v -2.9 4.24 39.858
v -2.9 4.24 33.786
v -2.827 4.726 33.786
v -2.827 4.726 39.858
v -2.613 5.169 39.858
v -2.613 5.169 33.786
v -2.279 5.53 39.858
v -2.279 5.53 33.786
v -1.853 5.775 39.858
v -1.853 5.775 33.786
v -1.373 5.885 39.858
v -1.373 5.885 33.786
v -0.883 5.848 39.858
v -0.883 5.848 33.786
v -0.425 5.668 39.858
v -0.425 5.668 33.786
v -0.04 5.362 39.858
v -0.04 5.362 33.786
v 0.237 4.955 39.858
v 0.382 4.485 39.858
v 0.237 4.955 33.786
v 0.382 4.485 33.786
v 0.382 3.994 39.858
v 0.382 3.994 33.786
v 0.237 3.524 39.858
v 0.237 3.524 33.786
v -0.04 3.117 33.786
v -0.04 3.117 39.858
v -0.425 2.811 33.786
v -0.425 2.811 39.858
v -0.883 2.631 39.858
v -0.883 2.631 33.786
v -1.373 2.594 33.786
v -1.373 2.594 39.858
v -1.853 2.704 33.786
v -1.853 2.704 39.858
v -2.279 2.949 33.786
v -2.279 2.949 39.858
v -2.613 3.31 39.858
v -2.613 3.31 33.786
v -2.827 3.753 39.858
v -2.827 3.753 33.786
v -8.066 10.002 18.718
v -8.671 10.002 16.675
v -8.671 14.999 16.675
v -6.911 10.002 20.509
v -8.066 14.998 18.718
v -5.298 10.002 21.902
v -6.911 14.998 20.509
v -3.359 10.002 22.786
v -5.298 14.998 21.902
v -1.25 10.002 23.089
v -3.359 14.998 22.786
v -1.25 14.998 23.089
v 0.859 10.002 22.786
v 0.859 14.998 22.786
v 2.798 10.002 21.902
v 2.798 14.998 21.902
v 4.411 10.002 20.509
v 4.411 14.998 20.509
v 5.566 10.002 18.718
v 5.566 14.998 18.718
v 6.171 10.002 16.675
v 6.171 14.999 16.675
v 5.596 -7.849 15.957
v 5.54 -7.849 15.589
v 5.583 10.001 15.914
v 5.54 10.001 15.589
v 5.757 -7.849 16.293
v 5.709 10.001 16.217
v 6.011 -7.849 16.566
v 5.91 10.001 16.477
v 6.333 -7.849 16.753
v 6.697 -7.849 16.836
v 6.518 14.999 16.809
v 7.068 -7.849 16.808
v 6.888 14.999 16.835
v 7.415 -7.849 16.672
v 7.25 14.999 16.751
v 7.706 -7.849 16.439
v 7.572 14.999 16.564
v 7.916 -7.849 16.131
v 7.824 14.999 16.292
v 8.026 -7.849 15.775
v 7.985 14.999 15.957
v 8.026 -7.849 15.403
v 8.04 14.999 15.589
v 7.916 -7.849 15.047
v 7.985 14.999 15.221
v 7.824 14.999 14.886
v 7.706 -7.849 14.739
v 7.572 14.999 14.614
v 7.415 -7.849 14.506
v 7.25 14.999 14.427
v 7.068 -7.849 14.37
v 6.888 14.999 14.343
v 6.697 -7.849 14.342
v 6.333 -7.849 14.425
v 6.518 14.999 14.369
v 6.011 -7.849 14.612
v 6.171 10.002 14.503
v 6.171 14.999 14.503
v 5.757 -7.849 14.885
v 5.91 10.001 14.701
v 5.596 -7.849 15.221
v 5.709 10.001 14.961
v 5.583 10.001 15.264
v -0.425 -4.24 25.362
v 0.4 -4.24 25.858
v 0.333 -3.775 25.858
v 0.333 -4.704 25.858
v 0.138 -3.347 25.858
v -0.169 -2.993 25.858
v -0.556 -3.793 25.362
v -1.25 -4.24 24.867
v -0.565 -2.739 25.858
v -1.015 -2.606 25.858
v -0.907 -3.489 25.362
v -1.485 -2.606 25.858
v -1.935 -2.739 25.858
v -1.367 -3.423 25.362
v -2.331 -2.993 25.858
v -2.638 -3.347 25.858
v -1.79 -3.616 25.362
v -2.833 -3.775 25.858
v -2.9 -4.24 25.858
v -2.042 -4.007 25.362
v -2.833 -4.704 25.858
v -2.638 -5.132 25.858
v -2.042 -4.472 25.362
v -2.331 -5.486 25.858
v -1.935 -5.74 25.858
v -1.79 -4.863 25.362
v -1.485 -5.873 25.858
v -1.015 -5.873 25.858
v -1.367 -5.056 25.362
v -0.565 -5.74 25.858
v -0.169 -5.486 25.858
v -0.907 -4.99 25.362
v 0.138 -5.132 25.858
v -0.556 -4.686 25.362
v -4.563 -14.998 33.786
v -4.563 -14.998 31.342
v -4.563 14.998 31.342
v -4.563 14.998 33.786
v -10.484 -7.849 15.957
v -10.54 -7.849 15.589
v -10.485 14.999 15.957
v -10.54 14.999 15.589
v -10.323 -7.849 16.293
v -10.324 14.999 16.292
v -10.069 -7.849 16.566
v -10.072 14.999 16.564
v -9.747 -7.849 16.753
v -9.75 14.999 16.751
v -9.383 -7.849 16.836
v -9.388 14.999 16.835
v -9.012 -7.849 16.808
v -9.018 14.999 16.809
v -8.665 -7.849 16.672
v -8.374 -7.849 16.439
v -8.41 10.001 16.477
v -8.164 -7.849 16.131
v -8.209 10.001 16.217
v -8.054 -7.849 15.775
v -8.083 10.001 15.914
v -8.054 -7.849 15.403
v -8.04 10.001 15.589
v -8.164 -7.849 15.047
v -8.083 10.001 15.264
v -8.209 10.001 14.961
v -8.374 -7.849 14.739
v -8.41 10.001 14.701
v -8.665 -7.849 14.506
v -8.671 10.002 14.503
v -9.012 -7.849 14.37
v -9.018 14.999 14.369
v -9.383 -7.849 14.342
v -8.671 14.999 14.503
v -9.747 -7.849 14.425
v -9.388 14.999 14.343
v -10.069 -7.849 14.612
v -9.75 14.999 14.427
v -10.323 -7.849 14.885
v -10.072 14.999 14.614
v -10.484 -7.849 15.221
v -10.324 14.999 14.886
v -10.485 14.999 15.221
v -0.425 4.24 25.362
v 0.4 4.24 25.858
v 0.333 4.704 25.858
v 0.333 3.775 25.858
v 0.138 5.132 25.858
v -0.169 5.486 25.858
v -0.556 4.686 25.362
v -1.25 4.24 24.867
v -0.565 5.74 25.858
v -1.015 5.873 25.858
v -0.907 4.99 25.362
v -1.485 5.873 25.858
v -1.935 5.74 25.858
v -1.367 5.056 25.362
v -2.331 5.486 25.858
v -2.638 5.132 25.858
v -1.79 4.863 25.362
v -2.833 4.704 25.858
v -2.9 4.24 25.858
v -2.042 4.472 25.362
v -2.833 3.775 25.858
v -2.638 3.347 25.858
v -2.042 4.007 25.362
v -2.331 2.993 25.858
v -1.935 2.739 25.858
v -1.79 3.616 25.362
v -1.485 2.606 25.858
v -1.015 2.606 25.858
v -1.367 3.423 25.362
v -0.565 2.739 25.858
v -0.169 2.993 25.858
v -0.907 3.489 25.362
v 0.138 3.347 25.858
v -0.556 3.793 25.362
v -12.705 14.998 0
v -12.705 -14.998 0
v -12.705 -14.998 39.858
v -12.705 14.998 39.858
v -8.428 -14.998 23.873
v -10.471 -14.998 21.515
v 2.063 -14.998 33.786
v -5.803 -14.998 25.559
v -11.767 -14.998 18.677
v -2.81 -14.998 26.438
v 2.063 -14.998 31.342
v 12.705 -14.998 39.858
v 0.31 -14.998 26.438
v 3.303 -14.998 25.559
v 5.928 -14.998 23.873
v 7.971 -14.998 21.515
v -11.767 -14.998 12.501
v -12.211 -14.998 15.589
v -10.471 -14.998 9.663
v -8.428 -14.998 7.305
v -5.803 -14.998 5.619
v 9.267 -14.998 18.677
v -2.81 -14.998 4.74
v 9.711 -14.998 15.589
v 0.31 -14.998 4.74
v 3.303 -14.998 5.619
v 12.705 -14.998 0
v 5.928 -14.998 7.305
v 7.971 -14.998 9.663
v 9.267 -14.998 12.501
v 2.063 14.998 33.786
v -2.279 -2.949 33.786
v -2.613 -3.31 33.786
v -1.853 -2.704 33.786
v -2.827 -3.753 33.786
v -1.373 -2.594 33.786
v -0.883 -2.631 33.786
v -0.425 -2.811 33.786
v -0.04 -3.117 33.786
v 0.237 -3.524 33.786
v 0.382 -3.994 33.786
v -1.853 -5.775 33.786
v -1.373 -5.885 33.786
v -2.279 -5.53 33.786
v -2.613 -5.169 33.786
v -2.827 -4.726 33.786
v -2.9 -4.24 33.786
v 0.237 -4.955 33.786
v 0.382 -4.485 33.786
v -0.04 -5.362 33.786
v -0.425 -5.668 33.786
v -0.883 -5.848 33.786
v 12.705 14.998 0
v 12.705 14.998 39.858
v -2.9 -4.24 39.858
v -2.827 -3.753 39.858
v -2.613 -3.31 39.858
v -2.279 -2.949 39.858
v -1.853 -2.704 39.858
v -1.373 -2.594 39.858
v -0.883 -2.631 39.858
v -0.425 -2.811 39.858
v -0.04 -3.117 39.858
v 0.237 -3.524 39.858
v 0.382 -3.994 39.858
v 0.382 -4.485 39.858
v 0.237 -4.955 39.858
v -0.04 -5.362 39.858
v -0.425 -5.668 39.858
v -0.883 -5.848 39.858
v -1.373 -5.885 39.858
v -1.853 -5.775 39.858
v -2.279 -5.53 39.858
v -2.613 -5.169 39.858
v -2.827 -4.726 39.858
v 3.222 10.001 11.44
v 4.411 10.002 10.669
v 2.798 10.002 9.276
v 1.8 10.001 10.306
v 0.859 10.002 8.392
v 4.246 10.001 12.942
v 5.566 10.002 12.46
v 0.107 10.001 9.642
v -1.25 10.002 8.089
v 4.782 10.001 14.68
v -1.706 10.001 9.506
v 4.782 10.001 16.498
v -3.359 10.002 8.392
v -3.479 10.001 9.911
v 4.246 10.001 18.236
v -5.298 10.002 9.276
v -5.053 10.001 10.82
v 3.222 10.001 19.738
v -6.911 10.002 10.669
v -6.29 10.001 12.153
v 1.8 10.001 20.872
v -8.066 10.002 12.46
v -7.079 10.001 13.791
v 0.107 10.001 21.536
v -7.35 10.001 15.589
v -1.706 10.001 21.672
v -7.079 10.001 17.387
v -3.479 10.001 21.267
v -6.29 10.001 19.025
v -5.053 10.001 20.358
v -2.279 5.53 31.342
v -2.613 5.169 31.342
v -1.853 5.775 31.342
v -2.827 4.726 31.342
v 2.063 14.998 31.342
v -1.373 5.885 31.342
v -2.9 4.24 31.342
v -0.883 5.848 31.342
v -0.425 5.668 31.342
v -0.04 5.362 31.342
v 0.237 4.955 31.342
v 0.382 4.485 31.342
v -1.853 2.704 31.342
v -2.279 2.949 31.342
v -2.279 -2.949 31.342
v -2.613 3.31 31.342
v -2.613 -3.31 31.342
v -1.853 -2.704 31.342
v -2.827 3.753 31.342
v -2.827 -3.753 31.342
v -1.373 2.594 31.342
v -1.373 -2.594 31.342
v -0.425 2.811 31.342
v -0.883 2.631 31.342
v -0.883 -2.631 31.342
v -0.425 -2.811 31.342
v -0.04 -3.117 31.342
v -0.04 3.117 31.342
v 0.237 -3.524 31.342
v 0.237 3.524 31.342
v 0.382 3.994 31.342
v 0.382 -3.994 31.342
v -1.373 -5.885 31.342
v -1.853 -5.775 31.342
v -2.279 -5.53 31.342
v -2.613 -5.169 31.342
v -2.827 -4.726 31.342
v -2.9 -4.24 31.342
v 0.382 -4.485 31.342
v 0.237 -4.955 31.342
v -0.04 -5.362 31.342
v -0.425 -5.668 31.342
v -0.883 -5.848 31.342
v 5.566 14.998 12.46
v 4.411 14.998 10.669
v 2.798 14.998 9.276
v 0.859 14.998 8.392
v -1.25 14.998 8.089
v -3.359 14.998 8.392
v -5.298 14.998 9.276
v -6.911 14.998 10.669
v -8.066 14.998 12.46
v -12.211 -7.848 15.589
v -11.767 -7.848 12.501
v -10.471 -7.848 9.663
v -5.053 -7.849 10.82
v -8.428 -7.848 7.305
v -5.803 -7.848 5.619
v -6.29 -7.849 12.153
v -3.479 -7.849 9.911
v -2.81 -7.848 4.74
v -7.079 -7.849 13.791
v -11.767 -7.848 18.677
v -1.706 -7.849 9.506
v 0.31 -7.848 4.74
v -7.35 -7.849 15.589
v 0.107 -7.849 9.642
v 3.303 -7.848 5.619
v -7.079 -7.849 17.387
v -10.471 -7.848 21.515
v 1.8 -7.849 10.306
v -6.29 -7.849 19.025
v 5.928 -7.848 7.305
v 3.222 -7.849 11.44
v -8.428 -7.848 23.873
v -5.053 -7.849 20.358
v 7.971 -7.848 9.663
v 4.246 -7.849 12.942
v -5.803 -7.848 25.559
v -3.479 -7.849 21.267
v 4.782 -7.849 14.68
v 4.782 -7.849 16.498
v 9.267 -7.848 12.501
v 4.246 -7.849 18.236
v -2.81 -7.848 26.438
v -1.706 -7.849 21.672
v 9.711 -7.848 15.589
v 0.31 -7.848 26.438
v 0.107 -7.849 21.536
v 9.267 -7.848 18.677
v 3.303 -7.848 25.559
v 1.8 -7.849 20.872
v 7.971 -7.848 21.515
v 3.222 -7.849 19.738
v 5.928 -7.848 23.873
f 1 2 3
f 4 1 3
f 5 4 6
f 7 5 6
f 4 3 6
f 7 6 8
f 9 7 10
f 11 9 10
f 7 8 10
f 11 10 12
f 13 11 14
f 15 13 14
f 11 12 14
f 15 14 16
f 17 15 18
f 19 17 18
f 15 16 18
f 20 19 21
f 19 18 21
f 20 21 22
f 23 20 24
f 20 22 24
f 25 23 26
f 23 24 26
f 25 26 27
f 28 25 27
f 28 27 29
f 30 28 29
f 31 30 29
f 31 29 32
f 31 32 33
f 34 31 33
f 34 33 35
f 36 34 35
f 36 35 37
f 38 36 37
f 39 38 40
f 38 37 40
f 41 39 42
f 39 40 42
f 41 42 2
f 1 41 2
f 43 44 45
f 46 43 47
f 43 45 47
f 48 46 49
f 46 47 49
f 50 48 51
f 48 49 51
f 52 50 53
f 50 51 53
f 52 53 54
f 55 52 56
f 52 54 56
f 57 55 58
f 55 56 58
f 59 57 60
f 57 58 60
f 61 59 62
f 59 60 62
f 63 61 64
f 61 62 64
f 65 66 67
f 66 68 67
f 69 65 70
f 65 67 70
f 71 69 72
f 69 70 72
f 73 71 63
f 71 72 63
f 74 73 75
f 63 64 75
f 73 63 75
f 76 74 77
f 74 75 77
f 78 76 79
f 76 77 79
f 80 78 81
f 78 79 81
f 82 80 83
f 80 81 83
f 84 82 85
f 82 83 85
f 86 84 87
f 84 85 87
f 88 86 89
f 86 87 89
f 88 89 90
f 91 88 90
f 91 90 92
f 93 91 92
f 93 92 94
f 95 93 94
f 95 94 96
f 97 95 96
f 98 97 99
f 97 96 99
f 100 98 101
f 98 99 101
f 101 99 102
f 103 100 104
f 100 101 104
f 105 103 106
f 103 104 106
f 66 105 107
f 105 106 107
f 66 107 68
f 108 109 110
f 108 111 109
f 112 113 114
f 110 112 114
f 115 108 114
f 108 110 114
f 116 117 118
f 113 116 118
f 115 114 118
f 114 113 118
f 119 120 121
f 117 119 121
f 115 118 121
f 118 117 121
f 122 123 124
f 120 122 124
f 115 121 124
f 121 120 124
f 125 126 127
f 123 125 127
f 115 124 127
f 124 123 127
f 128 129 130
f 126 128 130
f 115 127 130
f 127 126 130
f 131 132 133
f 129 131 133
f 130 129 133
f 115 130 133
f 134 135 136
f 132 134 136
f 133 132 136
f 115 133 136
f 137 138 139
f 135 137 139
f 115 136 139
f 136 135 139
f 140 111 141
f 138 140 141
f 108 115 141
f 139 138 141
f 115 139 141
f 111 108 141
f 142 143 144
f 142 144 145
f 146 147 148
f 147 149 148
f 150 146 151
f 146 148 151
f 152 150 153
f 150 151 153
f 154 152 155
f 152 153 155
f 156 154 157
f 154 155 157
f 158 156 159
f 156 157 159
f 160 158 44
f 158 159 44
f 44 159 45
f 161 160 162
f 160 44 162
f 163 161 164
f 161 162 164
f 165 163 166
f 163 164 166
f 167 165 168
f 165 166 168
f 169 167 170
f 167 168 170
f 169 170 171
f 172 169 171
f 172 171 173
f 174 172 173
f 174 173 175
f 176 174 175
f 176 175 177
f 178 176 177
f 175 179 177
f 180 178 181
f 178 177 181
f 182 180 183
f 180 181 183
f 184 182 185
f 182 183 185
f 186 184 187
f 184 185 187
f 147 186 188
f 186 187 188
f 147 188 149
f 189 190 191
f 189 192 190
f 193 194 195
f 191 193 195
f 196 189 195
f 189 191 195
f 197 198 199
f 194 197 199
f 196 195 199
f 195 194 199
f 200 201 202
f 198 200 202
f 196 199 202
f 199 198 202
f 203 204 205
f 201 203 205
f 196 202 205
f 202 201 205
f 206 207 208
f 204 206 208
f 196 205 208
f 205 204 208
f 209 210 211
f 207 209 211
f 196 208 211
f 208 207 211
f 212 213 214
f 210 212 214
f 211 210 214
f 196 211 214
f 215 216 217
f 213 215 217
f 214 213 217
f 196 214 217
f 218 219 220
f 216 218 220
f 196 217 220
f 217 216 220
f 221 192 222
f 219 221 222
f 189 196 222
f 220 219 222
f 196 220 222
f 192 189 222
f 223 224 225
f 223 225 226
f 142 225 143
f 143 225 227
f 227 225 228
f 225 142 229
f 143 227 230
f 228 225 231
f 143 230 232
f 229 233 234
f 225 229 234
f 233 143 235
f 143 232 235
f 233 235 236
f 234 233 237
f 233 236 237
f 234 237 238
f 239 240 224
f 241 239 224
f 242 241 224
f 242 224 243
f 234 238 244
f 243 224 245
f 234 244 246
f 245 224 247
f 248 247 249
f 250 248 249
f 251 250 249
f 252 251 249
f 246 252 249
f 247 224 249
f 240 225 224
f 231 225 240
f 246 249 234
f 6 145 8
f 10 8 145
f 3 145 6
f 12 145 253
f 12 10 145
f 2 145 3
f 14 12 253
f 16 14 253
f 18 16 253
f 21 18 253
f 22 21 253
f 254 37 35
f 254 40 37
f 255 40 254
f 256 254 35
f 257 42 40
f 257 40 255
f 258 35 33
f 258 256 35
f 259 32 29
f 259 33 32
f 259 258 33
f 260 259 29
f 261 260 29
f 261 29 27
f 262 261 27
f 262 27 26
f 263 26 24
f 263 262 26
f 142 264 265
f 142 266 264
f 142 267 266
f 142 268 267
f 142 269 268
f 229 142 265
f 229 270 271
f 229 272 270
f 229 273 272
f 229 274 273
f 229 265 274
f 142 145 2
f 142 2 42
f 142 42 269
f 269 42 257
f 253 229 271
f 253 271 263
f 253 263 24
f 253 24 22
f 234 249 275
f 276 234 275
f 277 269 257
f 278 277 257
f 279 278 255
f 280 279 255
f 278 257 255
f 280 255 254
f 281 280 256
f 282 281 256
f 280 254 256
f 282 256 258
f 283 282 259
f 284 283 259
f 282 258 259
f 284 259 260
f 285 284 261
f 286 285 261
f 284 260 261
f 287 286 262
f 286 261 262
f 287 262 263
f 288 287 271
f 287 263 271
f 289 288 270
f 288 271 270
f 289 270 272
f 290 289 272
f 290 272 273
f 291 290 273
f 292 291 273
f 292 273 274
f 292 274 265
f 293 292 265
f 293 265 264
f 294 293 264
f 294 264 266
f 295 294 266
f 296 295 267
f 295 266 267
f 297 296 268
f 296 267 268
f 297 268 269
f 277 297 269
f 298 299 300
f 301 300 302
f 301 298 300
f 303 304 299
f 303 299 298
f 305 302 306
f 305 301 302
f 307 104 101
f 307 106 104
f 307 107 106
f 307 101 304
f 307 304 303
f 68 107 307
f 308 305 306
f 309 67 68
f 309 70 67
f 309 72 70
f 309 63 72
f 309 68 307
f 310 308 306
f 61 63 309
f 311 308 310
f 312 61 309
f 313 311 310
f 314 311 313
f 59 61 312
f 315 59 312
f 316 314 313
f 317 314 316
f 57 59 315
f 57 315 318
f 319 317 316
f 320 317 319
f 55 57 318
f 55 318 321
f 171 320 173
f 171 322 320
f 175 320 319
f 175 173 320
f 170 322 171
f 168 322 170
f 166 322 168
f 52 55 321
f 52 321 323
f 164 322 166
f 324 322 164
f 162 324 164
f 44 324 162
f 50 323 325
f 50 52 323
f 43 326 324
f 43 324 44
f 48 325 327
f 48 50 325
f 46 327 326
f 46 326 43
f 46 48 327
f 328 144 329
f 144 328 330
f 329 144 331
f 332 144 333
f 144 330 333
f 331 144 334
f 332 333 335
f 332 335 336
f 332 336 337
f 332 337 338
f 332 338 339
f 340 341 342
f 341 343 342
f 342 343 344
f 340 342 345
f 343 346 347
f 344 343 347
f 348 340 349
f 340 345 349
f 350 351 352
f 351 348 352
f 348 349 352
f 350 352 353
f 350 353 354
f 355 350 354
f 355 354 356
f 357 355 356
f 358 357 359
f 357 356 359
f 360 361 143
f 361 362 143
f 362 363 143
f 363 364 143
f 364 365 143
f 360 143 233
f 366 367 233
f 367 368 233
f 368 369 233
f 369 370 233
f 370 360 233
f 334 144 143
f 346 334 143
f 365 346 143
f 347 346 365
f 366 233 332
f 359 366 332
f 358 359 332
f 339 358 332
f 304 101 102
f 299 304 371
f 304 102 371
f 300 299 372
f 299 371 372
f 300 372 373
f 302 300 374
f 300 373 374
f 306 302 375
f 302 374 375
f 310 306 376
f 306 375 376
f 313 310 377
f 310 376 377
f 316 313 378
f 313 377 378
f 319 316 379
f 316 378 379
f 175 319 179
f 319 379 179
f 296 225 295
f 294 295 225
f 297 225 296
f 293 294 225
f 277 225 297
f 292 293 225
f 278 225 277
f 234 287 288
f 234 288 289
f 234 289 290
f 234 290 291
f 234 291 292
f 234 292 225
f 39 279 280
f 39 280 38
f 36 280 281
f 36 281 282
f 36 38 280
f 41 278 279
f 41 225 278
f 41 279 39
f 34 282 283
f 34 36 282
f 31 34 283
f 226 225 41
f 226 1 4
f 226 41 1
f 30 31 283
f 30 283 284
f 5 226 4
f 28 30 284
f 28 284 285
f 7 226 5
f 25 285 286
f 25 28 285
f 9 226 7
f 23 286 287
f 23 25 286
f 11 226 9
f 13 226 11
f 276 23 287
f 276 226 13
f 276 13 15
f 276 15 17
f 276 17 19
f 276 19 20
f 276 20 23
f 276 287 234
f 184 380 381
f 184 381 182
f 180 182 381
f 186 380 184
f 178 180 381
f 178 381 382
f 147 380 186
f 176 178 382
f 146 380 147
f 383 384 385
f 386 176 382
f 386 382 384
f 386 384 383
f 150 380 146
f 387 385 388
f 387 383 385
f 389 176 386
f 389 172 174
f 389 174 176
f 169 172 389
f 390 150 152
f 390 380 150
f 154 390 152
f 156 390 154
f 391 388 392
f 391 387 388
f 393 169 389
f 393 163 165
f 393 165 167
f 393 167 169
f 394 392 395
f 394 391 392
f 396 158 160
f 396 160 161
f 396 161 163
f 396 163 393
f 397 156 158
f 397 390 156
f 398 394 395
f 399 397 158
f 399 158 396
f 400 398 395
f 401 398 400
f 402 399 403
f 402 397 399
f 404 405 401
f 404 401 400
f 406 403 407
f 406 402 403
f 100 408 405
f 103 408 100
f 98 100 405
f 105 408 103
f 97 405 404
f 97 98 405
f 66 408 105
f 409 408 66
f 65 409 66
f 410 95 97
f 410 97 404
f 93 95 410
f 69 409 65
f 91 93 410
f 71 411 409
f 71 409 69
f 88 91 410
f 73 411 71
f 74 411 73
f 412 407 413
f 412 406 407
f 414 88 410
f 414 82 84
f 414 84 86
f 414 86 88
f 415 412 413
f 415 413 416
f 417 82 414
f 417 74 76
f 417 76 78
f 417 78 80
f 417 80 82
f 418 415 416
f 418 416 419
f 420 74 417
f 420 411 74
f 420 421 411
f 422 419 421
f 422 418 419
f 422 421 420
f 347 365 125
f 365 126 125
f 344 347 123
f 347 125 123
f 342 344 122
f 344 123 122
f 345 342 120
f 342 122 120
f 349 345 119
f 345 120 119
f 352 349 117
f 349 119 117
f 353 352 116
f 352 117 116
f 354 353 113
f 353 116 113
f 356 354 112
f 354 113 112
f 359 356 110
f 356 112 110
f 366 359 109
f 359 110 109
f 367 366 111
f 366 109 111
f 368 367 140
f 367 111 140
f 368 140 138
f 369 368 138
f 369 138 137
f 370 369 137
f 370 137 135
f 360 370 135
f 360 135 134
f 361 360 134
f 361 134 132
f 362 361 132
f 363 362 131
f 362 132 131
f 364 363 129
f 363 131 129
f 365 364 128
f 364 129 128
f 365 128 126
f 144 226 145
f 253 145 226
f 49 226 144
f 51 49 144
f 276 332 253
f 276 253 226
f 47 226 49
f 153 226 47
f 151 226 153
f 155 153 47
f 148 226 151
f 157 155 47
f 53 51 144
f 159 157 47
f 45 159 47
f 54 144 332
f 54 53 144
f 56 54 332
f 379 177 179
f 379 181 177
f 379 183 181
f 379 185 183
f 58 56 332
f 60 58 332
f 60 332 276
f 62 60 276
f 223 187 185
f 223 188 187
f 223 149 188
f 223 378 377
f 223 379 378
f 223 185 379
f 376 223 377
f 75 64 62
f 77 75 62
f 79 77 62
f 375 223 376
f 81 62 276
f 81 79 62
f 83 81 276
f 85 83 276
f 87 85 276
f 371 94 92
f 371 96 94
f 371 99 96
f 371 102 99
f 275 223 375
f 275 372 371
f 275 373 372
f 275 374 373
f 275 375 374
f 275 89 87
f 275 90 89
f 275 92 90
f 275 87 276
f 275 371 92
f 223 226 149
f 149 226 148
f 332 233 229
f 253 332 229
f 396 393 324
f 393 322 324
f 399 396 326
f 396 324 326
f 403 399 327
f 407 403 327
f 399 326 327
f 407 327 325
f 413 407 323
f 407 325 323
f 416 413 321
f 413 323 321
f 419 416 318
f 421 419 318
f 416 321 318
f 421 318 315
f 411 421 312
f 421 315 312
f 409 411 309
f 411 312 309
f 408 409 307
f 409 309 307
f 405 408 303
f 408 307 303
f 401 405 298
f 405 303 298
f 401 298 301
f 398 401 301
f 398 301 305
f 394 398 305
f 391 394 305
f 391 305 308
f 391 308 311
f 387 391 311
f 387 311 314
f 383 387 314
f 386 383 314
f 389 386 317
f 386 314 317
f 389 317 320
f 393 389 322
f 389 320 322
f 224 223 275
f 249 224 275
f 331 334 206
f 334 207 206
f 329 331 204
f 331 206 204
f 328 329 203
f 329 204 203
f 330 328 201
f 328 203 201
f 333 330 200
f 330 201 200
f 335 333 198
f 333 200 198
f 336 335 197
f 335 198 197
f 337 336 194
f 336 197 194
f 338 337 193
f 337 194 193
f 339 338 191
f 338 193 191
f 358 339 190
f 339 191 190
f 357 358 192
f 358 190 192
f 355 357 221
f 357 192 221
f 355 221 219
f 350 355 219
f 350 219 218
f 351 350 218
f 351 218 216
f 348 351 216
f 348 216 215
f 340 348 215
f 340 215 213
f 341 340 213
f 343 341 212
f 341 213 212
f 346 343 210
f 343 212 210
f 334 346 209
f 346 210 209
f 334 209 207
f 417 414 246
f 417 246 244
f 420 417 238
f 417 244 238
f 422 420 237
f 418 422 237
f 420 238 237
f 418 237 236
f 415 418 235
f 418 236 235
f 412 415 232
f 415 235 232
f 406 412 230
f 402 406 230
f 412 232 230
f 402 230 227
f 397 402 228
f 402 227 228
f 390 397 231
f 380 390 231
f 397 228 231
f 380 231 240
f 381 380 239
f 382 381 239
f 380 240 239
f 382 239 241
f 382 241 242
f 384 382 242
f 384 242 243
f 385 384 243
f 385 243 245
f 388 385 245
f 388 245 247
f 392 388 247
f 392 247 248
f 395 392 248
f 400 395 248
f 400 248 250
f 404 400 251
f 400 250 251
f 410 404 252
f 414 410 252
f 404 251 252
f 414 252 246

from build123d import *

# Parameters (mm, degrees)
F0_W      = 25.41
F0_H      = 29.997
F1_DEPTH  = 39.858
F4_D      = 3.3
F4_DEPTH  = 14
F4_TIP    = 0.9914200214
F3_W      = 6.626
F3_H      = 2.444
F5_DEPTH  = 29.998
F6_D      = 12.2
F7_D      = 2.5
F3_R      = 10.961
F8_DEPTH  = 7.15
F9_R      = 7.5
F10_DEPTH = 4.997


with BuildPart() as f1:
    # F0 (on Top) → F1 (new body)
    with BuildSketch(Plane.XY):
        Rectangle(F0_W, F0_H)
    extrude(amount=F1_DEPTH)

    # F4
    with Locations(Plane.XY.offset(39.858)):
        with Locations((-1.25, 4.2395), (-1.25, -4.2395)):
            Hole(F4_D / 2, depth=F4_DEPTH)
            with Locations((0, 0, -(F4_DEPTH + F4_TIP / 2))):  # 118° drill point
                Cone(0, F4_D / 2, F4_TIP, mode=Mode.SUBTRACT)

    # F3 (on face) → F5 (cut, through all)
    with BuildSketch(Plane.XZ.offset(14.9985)):
        with Locations((-1.25, 32.564)):
            Rectangle(F3_W, F3_H)
    extrude(amount=-F5_DEPTH, mode=Mode.SUBTRACT)

    # F6 (through all)
    with Locations(Plane.XZ.offset(14.9985)):
        with Locations((-1.25, 15.589)):
            Hole(F6_D / 2)

    # F7 (through all)
    with Locations(Plane.XZ.offset(14.9985)):
        with Locations((-9.29, 15.589), (6.79, 15.589)):
            Hole(F7_D / 2)

    # F3 (on face) → F8 (cut)
    with BuildSketch(Plane.XZ.offset(14.9985)):
        with Locations((-1.25, 15.589)):
            Circle(F3_R)
    extrude(amount=-F8_DEPTH, mode=Mode.SUBTRACT)

    # F9 (on face) → F10 (cut)
    with BuildSketch(Plane(origin=(0, 14.9985, 0), x_dir=(-1, 0, 0), z_dir=(0, 1, 0))):
        with Locations((1.25, 15.589)):
            Circle(F9_R)
    extrude(amount=-F10_DEPTH, mode=Mode.SUBTRACT)


solid = f1.part
